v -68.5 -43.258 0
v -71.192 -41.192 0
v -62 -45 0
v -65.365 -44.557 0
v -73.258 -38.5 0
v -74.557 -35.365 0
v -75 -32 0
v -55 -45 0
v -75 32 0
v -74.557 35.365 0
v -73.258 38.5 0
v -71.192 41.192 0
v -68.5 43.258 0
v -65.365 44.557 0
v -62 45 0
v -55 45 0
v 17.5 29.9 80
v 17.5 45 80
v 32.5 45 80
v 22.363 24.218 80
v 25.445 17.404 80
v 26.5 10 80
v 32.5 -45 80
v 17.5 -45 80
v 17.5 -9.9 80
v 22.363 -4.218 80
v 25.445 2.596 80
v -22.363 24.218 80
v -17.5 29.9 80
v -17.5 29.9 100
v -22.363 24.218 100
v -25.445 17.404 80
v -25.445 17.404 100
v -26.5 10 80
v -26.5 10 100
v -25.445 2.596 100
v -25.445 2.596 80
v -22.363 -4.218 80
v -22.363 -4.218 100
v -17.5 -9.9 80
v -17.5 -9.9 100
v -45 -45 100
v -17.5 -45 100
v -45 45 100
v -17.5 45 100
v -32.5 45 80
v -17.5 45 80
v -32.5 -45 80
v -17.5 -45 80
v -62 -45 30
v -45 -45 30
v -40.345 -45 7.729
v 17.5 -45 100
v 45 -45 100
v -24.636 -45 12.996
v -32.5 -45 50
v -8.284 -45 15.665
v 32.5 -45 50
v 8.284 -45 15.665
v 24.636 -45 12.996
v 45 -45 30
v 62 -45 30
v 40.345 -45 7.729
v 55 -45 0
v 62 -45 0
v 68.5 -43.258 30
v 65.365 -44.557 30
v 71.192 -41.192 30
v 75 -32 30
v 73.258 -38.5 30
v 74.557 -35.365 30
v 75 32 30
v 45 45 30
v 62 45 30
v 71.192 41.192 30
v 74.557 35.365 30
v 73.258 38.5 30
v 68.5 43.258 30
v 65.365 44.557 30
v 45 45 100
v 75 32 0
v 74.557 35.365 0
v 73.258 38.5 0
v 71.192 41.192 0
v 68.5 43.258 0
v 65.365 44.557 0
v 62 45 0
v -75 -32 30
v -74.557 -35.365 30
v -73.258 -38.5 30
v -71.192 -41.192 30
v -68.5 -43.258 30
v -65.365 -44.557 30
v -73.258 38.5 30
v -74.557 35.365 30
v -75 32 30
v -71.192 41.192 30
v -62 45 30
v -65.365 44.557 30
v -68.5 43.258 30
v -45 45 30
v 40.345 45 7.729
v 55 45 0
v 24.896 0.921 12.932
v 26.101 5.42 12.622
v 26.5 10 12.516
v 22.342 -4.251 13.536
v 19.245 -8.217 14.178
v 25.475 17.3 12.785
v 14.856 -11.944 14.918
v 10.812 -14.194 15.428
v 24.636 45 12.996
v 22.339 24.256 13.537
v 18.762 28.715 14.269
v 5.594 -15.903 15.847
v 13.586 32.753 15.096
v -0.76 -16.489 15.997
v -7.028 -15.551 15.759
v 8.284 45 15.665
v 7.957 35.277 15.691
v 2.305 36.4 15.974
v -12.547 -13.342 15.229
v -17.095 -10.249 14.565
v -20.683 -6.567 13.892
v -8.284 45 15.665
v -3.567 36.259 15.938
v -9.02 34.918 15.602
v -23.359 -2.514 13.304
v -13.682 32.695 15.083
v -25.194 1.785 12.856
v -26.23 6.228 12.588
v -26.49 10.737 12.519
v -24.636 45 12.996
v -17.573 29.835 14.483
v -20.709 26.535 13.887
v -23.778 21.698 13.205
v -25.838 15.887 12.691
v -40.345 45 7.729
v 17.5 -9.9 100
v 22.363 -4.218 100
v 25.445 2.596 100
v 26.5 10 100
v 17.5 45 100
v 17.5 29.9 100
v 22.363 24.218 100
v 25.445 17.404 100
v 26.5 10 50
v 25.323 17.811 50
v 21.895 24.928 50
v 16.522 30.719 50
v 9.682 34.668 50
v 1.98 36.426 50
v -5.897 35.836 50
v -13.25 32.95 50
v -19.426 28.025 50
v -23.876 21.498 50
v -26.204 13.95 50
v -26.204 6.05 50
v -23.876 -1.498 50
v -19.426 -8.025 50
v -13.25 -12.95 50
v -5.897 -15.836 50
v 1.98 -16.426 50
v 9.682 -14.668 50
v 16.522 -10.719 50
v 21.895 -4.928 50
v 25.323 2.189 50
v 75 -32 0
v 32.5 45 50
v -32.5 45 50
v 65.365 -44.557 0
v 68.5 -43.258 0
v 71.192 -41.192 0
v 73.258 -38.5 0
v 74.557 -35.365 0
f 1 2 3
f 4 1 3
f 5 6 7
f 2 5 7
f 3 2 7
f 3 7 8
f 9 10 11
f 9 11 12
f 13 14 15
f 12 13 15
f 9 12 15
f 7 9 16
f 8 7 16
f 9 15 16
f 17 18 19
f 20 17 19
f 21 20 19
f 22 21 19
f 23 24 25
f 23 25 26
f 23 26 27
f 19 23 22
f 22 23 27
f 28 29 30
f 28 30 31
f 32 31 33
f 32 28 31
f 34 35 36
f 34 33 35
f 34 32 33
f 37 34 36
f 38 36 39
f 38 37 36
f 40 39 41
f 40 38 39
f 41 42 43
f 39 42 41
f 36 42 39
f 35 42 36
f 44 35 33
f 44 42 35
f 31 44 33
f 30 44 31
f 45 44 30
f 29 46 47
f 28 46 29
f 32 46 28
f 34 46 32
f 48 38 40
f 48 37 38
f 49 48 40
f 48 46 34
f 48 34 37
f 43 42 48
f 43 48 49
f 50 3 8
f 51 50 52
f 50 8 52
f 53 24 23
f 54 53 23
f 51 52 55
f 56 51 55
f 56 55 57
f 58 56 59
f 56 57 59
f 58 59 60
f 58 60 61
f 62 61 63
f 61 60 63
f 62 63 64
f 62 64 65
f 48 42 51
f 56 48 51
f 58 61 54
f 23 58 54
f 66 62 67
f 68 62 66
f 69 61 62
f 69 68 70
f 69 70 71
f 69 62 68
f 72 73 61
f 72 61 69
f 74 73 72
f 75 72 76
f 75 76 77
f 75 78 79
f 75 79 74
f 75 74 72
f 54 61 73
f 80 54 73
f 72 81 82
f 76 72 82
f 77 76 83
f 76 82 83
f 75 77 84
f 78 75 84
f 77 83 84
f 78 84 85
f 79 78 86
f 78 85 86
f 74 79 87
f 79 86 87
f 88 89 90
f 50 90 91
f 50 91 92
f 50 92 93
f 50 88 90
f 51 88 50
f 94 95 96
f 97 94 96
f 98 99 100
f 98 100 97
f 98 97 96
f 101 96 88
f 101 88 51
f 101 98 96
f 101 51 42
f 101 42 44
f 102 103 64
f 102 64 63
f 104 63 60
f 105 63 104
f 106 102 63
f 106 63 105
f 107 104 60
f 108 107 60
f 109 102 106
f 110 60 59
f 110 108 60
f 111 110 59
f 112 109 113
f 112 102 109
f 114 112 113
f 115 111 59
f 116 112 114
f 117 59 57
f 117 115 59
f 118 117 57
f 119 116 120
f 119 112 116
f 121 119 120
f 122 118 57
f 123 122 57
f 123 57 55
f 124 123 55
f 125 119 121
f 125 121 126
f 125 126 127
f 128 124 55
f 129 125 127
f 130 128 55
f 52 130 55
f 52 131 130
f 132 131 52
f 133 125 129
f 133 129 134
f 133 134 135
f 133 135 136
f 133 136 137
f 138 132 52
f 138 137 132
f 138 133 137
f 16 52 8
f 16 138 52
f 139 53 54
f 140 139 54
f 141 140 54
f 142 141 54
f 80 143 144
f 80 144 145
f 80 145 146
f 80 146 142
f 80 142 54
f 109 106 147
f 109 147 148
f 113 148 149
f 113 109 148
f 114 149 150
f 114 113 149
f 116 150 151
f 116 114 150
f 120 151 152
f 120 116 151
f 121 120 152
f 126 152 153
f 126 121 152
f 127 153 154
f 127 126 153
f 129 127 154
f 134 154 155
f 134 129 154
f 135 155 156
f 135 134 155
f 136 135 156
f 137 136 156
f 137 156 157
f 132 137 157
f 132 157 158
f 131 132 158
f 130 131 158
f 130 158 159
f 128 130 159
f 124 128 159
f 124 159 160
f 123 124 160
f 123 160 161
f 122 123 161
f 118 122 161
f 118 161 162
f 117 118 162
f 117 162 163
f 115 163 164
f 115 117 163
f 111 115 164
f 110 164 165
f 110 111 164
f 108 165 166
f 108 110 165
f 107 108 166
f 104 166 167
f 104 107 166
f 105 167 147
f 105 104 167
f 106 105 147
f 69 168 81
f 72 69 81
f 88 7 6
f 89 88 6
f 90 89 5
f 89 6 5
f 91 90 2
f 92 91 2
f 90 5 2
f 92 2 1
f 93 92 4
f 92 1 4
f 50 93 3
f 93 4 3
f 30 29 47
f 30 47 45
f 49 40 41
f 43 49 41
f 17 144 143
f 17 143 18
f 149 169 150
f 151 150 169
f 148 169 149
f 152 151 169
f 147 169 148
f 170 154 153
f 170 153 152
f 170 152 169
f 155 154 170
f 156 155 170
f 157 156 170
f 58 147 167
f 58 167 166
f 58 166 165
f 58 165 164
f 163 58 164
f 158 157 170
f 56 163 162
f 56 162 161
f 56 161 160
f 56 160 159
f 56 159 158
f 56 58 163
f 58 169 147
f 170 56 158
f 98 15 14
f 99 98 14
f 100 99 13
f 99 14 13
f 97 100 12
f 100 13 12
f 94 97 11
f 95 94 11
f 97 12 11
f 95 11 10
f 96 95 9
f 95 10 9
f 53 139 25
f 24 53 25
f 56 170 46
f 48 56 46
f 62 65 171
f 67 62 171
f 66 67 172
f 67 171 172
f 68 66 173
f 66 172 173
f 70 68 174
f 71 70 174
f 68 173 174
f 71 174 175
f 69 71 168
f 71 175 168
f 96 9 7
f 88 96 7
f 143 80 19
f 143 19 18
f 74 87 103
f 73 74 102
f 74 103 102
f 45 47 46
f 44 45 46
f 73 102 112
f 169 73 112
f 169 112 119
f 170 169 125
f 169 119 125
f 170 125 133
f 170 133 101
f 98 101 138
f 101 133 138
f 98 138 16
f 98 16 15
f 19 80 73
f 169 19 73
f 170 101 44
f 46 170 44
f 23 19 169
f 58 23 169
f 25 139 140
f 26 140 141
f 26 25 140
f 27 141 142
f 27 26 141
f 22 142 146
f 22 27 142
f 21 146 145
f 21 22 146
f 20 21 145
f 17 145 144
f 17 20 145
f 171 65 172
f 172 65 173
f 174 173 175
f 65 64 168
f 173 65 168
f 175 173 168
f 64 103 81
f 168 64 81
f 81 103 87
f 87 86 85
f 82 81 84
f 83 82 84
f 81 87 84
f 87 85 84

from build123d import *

# Parameters (mm, degrees)
PAD_DEPTH         = 30
SKETCH002_W       = 90
SKETCH002_H       = 90
PAD001_DEPTH      = 100
POCKET_DEPTH      = 45.001
POCKET_DEPTH_BACK = -45.001
POCKET001_DEPTH   = 90.001
SKETCH004_R       = 26.5
POCKET002_DEPTH   = 100.001


with BuildPart() as part:
    # Sketch (on XY_Plane of Origin) → Pad (new body)
    with BuildSketch(Plane.XY):
        with BuildLine():
            Line((-75, 32), (-75, -32))
            ThreePointArc((-75, -32), (-71.192388, -41.192388), (-62, -45))
            Line((-62, -45), (62, -45))
            ThreePointArc((62, -45), (71.192388, -41.192388), (75, -32))
            Line((75, -32), (75, 32))
            ThreePointArc((75, 32), (71.192388, 41.192388), (62, 45))
            Line((62, 45), (-62, 45))
            ThreePointArc((-62, 45), (-71.192388, 41.192388), (-75, 32))
        make_face()
    extrude(amount=PAD_DEPTH)

    # Sketch002 (on XY_Plane of Origin) → Pad001 (join)
    with BuildSketch(Plane.XY):
        Rectangle(SKETCH002_W, SKETCH002_H)
    extrude(amount=PAD001_DEPTH)

    # Sketch001 (on XZ_Plane of Origin) → Pocket (cut, two sides)
    with BuildSketch(Plane.XZ) as pocket_sk:
        with BuildLine():
            ThreePointArc((55, 0), (0, 16), (-55, 0))
            Line((-55, 0), (55, 0))
        make_face()
    extrude(amount=-POCKET_DEPTH, mode=Mode.SUBTRACT)
    extrude(pocket_sk.sketch, amount=-POCKET_DEPTH_BACK, mode=Mode.SUBTRACT)

    # Sketch003 (on Face14 of Pocket) → Pocket001 (cut, through all)
    with BuildSketch(Plane.XZ.offset(45)):
        Polygon((-17.5, 100), (17.5, 100), (17.5, 80), (32.5, 80), (32.5, 50), (-32.5, 50), (-32.5, 80), (-17.5, 80), align=None)
    extrude(amount=-POCKET001_DEPTH, mode=Mode.SUBTRACT)

    # Sketch004 (on XY_Plane of Origin) → Pocket002 (cut, through all)
    with BuildSketch(Plane.XY):
        with Locations((0, 10)):
            Circle(SKETCH004_R)
    extrude(amount=POCKET002_DEPTH, mode=Mode.SUBTRACT)


solid = part.part
